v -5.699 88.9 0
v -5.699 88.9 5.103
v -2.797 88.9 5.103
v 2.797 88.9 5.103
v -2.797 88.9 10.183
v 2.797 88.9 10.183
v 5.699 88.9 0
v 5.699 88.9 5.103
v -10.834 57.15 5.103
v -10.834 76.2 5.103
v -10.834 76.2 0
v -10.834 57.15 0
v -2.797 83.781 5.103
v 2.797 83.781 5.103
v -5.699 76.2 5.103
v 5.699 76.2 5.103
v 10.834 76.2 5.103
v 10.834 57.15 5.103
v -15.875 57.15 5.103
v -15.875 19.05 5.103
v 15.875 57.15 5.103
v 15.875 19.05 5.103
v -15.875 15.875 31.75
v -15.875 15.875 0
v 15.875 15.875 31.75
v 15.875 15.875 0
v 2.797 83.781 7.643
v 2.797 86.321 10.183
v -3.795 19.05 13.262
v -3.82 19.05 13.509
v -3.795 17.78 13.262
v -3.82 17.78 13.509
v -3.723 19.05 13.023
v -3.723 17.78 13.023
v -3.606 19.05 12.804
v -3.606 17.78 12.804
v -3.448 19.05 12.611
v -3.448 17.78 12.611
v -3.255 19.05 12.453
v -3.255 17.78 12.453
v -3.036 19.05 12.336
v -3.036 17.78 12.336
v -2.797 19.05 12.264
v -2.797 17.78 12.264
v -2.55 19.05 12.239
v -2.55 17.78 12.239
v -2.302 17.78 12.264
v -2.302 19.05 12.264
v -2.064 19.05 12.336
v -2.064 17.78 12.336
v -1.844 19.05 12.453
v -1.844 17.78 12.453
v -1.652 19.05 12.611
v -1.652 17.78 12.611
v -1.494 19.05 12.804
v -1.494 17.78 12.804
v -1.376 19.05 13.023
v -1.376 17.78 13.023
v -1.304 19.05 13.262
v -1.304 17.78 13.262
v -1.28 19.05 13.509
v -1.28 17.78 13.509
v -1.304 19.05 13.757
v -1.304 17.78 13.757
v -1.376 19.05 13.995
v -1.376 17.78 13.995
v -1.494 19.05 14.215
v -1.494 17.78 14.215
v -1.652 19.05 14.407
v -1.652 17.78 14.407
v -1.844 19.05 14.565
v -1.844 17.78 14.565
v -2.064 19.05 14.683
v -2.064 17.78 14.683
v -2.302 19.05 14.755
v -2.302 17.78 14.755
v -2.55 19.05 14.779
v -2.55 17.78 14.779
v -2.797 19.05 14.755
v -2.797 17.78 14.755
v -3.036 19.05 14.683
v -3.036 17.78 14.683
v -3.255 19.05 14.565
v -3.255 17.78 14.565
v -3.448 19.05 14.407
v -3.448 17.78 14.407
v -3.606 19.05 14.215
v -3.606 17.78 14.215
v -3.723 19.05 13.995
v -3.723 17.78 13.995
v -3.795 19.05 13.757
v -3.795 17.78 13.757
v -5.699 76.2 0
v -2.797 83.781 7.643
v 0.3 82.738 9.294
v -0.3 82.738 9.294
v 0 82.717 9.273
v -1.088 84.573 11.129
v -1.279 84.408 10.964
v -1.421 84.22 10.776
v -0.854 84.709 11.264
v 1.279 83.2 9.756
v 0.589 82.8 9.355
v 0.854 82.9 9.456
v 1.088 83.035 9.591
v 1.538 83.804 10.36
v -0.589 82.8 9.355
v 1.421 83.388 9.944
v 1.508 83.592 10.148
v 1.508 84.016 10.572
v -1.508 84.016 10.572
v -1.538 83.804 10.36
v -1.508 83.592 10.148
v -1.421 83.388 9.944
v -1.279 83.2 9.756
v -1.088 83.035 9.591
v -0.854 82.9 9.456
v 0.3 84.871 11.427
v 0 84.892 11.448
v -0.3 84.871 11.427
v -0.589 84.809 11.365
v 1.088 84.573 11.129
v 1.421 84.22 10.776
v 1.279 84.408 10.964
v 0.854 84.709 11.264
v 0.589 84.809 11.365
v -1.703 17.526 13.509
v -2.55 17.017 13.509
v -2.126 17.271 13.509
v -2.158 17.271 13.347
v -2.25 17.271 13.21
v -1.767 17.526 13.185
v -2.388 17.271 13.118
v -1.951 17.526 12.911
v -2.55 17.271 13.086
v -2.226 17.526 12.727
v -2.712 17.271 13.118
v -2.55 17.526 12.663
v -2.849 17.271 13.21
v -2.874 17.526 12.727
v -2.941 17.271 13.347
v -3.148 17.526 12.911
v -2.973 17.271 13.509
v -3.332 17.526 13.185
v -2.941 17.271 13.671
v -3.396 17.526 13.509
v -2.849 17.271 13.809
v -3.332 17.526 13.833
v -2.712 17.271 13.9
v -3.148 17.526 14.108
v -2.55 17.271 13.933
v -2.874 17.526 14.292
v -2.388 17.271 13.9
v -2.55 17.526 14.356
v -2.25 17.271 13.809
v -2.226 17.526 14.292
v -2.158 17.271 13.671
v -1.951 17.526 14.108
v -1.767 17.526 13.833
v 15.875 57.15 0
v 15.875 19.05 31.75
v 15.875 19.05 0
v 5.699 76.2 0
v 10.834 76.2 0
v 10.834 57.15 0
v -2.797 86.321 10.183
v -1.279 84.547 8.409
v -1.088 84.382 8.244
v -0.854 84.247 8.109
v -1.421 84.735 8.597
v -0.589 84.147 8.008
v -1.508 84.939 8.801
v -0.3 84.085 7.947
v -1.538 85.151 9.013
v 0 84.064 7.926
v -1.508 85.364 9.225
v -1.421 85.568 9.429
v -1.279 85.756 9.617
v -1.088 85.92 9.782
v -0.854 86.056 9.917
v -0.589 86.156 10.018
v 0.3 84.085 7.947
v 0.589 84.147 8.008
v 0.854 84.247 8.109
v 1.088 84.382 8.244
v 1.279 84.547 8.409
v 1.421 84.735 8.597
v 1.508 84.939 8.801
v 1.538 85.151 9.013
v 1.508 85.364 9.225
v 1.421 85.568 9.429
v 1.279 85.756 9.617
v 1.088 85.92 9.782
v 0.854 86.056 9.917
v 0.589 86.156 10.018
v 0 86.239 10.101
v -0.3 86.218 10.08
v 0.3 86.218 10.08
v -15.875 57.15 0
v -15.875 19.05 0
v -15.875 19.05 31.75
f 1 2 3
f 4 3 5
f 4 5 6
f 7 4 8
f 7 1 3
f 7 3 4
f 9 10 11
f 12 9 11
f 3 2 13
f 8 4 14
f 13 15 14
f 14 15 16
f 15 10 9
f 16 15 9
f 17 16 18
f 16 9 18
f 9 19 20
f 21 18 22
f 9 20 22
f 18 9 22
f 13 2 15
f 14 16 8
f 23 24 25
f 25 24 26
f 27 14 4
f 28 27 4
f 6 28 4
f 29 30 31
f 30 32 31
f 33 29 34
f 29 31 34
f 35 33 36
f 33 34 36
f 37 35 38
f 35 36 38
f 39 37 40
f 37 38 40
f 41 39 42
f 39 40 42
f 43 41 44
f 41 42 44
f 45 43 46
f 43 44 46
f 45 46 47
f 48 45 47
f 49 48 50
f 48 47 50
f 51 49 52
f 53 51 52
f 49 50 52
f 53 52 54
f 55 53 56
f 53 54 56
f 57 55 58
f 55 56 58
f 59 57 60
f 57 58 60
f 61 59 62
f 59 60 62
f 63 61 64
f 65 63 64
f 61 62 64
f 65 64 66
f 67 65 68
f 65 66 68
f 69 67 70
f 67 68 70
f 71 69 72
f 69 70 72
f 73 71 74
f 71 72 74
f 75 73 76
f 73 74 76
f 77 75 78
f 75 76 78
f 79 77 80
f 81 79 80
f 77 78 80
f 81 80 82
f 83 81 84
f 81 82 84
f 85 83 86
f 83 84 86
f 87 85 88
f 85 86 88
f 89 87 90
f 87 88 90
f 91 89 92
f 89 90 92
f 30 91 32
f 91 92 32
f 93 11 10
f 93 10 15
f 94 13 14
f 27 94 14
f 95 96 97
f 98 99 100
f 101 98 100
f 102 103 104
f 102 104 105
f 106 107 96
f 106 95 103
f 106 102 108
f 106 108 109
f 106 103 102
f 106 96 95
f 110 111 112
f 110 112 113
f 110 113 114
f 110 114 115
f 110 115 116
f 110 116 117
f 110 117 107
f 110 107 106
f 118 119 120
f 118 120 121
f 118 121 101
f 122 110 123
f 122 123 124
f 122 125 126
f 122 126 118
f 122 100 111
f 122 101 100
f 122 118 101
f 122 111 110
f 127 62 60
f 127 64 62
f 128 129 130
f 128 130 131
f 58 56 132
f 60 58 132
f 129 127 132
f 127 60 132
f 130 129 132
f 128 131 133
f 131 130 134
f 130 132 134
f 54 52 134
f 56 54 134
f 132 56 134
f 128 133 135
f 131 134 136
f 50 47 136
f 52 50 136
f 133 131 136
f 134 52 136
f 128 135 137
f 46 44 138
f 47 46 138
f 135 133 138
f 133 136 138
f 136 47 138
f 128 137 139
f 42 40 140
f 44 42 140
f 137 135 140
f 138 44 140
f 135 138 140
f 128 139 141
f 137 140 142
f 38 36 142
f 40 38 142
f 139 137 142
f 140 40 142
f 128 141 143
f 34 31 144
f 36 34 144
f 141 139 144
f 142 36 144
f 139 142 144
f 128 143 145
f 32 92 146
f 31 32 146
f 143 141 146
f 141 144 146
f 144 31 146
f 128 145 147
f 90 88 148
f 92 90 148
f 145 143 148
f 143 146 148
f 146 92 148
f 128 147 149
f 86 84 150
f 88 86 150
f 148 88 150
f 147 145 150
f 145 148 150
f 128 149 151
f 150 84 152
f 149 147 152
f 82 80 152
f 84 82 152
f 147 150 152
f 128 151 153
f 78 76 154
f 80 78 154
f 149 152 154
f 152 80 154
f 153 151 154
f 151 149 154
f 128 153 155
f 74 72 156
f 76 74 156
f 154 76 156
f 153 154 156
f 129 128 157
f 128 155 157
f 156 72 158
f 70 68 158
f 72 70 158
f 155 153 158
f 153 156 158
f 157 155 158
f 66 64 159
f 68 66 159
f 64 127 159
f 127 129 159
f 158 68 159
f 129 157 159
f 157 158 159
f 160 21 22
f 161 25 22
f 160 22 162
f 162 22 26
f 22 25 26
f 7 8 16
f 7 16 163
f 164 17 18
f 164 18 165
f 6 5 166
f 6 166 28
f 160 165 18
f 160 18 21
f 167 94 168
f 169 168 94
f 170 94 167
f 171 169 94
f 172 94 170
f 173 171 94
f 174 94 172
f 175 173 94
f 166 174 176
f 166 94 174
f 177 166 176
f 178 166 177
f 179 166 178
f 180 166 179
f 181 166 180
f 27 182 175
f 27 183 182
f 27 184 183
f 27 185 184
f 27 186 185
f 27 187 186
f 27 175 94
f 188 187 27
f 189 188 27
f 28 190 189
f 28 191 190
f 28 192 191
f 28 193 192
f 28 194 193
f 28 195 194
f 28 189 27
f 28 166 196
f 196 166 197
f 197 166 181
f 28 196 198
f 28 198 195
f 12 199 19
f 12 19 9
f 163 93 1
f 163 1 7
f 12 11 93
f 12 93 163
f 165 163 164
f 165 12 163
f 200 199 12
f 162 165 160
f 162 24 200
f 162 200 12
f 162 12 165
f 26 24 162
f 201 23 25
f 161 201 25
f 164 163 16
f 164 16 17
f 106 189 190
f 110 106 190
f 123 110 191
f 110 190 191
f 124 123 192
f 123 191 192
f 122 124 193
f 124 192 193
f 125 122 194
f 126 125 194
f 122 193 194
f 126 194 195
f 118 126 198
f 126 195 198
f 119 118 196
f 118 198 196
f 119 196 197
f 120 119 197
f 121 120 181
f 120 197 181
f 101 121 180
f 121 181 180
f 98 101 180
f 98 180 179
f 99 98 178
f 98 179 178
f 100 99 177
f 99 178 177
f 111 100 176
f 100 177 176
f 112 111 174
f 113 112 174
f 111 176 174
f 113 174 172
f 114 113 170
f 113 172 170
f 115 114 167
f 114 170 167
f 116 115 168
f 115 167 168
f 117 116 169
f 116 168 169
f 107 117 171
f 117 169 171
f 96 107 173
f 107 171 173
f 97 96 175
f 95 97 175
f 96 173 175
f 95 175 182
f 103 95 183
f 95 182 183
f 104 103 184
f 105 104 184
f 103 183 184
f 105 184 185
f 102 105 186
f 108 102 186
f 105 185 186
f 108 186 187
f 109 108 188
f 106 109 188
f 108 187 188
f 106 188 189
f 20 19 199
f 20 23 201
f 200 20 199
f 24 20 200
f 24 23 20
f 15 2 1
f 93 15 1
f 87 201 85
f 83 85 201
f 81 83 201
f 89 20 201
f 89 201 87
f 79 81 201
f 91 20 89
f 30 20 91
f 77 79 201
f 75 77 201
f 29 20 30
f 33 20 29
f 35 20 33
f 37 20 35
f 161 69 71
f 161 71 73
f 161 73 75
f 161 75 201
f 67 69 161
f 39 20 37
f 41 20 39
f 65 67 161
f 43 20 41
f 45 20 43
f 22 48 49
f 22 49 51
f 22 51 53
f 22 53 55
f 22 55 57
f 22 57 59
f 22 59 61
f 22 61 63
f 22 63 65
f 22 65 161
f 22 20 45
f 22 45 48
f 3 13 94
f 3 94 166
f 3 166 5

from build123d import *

# Parameters (mm, degrees)
F0_W      = 31.75
F0_H      = 31.75
F1_DEPTH  = 3.175
F3_D      = 2.54
F3_DEPTH  = 1.27
F3_TIP    = 0.7630929862
F4_W      = 31.75
F4_H      = 5.1026814207
F5_DEPTH  = 38.1
F6_W      = 21.6686837375
F6_H      = 5.1026814207
F7_DEPTH  = 19.05
F8_W      = 11.3971428946
F8_H      = 5.1026814207
F9_DEPTH  = 12.7
F10_W     = 5.5938977748
F10_H     = 5.1191067934
F11_DEPTH = 5.08
F12_SIZE  = 2.54
F14_ANGLE = -90
F15_R     = 1.5379719929
F16_DEPTH = 1.905


with BuildPart() as f1:
    # F0 (on Top) → F1 (new body)
    with BuildSketch(Plane.XY):
        Rectangle(F0_W, F0_H)
    extrude(amount=F1_DEPTH)

    # F3
    with Locations(Plane.XY.offset(3.175)):
        with Locations((-2.5495558511, 2.3657830898)):
            Hole(F3_D / 2, depth=F3_DEPTH)
            with Locations((0, 0, -(F3_DEPTH + F3_TIP / 2))):  # 118° drill point
                Cone(0, F3_D / 2, F3_TIP, mode=Mode.SUBTRACT)

    # F4 (on face) → F5 (join)
    with BuildSketch(Plane.XY.offset(3.175)):
        with Locations((0, 13.3236592896)):
            Rectangle(F4_W, F4_H)
    extrude(amount=F5_DEPTH)

    # F6 (on face) → F7 (join)
    with BuildSketch(Plane.XY.offset(41.275)):
        with Locations((0, 13.3236592896)):
            Rectangle(F6_W, F6_H)
    extrude(amount=F7_DEPTH)

    # F8 (on face) → F9 (join)
    with BuildSketch(Plane.XY.offset(60.325)):
        with Locations((0, 13.3236592896)):
            Rectangle(F8_W, F8_H)
    extrude(amount=F9_DEPTH)

    # F10 (on face) → F11 (join)
    with BuildSketch(Plane.XZ.offset(-10.7723185793)):
        with Locations((0, 70.4654466033)):
            Rectangle(F10_W, F10_H)
    extrude(amount=F11_DEPTH)

    # F12
    f12_edges = [f1.edges().sort_by_distance(p)[0] for p in [
        (0, 5.692319, 67.905893),
    ]]
    chamfer(f12_edges, length=F12_SIZE)


with BuildPart() as f1_1:
    # F14: moved
    add(f1.part.rotate(Axis((0, 15.8751159906, 0), (1, 0, 0)), F14_ANGLE))

    # F15 (on face) → F16 (join)
    with BuildSketch(Plane(origin=(0, 38.0691058929, -38.0691058929), x_dir=(1, 0, 0), z_dir=(0, -0.7071067812, 0.7071067812))):
        with Locations((0, 66.584341228)):
            Circle(F15_R)
    extrude(amount=F16_DEPTH)


solid = f1_1.part
